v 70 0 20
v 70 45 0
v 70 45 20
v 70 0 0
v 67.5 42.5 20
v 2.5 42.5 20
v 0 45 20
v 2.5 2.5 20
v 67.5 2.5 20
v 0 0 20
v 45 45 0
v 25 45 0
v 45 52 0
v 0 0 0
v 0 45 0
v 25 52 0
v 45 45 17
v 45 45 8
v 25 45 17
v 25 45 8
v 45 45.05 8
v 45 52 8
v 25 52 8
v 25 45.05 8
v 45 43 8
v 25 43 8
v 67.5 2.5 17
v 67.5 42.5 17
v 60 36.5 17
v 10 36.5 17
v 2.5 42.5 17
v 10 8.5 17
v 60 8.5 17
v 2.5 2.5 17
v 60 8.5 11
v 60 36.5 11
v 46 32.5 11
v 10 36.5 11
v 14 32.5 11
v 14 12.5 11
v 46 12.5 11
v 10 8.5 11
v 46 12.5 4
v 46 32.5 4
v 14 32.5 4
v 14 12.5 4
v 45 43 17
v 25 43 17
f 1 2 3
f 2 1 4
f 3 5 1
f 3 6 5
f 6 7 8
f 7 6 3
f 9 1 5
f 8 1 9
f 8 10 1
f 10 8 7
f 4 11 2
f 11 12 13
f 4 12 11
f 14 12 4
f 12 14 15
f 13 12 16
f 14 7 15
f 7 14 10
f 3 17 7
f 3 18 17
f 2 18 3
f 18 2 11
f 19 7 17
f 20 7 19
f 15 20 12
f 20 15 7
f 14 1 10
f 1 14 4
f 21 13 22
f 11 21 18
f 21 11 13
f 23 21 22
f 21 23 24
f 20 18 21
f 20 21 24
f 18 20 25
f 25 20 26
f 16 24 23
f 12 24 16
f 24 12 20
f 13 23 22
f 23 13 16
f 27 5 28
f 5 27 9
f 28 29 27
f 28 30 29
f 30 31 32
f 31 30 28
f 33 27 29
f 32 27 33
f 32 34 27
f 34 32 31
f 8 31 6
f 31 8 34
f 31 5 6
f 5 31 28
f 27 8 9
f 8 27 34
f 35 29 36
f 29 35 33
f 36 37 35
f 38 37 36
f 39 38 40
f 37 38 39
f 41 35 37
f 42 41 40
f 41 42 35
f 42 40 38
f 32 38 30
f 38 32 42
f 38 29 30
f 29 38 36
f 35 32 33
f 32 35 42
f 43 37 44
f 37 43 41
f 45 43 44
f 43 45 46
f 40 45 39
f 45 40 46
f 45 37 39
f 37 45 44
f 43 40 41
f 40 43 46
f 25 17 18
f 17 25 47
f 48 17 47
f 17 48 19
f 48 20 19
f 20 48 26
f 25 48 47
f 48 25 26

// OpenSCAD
// Nested stepped-cavity body with side tab and side recess (mm)
body_length = 70;
body_width  = 45;
body_height = 20;

rim_width    = 2.5;
upper_depth  = 3;

mid_length = 50;
mid_width  = 28;
mid_depth  = 6;

deep_length = 32;
deep_width  = 20;
deep_depth  = 7;
deep_shift  = 4;          // extra inset toward -X inside mid pocket

proj_length = 20;
proj_width  = 7;
proj_height = 8;

recess_length = 20;
recess_depth  = 2;
recess_height = 9;        // sits directly above the projection

eps = 0.05;

module body_block() {
    cube([body_length, body_width, body_height]);
}

module side_projection() {
    translate([(body_length - proj_length) / 2, body_width, 0])
        cube([proj_length, proj_width, proj_height]);
}

module upper_recess() {
    translate([rim_width, rim_width, body_height - upper_depth])
        cube([
            body_length - 2 * rim_width,
            body_width  - 2 * rim_width,
            upper_depth + eps
        ]);
}

module mid_pocket() {
    mx = (body_length - mid_length) / 2;
    my = (body_width  - mid_width)  / 2;
    translate([mx, my, body_height - upper_depth - mid_depth])
        cube([mid_length, mid_width, upper_depth + mid_depth + eps]);
}

module deep_pocket() {
    mx = (body_length - mid_length) / 2;
    my = (body_width  - mid_width)  / 2;
    dx = mx + deep_shift;
    dy = my + (mid_width - deep_width) / 2;
    dz = body_height - upper_depth - mid_depth - deep_depth;
    translate([dx, dy, dz])
        cube([
            deep_length,
            deep_width,
            upper_depth + mid_depth + deep_depth + eps
        ]);
}

module side_recess() {
    translate([
        (body_length - recess_length) / 2,
        body_width - recess_depth,
        proj_height
    ])
        cube([recess_length, recess_depth + eps, recess_height]);
}

difference() {
    union() {
        body_block();
        side_projection();
    }
    upper_recess();
    mid_pocket();
    deep_pocket();
    side_recess();
}
